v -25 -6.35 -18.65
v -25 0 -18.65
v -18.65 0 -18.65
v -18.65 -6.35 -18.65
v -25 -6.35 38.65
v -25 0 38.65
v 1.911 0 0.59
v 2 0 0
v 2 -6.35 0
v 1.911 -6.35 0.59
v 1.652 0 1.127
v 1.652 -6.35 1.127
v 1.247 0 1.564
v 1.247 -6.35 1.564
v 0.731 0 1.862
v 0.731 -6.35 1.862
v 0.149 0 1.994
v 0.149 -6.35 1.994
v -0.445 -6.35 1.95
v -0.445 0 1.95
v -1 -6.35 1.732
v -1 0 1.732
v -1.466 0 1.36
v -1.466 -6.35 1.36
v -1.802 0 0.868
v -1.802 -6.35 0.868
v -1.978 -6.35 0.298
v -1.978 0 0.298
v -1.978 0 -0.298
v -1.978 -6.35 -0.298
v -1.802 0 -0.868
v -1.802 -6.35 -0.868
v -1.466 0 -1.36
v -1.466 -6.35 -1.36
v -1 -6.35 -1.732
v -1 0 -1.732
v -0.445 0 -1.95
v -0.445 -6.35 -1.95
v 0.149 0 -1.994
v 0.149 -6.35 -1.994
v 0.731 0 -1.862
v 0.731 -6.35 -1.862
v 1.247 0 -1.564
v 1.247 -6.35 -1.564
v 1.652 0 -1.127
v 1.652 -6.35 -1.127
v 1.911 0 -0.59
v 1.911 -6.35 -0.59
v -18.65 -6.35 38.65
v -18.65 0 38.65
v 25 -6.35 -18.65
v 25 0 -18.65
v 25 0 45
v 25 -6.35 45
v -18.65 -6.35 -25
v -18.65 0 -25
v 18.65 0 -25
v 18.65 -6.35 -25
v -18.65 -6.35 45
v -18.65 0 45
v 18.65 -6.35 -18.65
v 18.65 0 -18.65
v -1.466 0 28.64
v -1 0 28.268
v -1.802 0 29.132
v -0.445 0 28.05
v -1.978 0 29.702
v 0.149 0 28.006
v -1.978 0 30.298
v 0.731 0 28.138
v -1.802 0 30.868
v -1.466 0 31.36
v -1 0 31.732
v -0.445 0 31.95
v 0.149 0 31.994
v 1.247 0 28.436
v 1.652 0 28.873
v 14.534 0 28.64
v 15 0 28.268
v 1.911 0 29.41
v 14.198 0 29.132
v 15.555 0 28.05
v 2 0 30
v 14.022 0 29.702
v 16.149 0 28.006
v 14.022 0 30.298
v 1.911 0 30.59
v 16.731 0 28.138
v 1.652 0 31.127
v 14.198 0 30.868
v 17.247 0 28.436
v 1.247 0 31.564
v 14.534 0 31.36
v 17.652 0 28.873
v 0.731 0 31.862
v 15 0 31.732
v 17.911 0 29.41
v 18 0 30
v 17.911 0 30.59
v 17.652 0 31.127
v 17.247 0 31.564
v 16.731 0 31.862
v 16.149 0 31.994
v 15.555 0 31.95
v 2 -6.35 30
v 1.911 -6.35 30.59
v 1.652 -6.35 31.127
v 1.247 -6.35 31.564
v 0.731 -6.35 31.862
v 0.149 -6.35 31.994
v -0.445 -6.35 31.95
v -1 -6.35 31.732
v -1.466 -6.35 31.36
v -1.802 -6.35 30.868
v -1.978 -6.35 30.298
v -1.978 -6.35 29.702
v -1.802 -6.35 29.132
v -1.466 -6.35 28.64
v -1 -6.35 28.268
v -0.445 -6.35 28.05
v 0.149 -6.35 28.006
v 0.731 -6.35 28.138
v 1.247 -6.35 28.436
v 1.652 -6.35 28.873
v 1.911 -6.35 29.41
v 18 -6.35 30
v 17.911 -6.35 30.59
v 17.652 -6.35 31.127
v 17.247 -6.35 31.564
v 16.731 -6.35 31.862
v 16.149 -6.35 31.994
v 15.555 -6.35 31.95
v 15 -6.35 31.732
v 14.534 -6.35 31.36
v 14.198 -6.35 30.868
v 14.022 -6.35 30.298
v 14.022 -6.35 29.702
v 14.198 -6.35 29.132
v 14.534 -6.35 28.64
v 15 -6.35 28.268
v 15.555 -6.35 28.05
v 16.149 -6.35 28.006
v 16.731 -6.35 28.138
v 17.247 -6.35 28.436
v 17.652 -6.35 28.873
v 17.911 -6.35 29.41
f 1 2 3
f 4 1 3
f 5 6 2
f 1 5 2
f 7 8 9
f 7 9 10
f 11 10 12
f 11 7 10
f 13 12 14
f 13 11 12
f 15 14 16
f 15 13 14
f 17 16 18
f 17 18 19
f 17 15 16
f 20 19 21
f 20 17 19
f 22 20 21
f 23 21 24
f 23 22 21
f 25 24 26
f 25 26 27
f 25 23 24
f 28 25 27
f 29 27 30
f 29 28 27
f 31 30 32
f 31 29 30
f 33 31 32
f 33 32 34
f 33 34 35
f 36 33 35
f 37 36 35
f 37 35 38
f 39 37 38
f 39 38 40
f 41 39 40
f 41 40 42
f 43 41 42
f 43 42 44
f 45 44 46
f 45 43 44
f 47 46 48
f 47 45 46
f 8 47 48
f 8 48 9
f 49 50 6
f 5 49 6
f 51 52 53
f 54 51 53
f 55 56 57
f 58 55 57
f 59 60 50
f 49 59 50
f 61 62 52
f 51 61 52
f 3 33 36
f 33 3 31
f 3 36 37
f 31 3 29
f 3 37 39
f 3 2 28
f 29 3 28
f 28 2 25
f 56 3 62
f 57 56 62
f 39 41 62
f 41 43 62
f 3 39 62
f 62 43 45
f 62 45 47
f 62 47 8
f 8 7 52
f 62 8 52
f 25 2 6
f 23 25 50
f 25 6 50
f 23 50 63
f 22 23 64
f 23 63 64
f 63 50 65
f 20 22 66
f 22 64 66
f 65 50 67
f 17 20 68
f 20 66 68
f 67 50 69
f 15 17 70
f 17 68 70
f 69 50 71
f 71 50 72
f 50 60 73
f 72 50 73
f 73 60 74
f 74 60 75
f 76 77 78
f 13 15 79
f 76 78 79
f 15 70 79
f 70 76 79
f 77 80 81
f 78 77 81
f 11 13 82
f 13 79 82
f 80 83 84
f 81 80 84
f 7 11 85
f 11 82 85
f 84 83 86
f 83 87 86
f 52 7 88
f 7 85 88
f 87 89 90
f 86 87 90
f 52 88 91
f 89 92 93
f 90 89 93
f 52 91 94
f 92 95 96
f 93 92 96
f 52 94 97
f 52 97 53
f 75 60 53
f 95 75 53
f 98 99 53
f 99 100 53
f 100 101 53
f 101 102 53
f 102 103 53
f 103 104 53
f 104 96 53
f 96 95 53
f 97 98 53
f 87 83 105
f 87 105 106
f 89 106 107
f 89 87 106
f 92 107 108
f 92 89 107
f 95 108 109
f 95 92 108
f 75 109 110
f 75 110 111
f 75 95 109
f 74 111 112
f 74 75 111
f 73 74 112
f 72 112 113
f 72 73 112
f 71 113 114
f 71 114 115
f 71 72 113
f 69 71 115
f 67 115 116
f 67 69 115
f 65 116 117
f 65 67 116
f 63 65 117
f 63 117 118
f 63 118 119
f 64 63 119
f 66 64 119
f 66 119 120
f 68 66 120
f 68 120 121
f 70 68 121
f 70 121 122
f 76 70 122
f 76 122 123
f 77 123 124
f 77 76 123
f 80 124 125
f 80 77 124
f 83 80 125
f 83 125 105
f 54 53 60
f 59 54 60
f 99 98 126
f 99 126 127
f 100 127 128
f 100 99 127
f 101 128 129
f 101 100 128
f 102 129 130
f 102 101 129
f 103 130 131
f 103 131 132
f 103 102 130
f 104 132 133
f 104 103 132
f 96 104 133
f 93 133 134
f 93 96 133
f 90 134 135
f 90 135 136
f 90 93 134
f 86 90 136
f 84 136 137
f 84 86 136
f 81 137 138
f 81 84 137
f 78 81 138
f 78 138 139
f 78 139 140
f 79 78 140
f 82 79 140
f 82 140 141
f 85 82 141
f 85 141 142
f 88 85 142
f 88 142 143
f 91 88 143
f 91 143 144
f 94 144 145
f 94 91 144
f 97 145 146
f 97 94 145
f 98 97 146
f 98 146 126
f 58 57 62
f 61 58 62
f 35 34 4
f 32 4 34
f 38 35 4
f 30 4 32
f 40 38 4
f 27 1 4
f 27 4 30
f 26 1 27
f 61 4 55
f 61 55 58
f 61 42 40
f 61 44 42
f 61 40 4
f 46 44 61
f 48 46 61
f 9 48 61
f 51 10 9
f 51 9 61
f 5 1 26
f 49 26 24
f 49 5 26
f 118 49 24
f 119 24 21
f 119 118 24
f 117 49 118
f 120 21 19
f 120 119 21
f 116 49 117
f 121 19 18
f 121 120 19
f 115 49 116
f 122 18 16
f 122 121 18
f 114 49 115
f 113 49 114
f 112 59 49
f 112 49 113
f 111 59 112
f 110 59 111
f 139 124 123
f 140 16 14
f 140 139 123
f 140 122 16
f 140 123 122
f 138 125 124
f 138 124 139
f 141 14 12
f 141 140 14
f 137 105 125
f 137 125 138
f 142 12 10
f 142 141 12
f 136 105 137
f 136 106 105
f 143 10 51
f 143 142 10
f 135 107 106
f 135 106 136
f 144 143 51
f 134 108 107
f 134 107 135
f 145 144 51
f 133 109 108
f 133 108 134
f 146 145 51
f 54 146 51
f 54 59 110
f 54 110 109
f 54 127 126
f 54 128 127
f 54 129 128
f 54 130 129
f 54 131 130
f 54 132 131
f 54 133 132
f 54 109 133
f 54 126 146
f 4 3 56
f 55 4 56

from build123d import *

# Parameters (mm, degrees)
F0_R     = 2
F1_DEPTH = 6.35


# Not quite as in the source:
# - a length typed as a fraction of an inch, garbled in the dataset ("3 / 203.2 mm" for 3/8 in), is restored


with BuildPart() as f1:
    # F0 (on Front) → F1 (new body)
    with BuildSketch(Plane.XZ):
        Polygon((25, 45), (-18.65, 45), (-18.65, 38.65), (-25, 38.65), (-25, 30), (-25, -18.65), (-18.65, -18.65), (-18.65, -25), (18.65, -25), (18.65, -18.65), (25, -18.65), align=None)
        Circle(F0_R, mode=Mode.SUBTRACT)
        with Locations((0, 30)):
            Circle(F0_R, mode=Mode.SUBTRACT)
        with Locations((16, 30)):
            Circle(F0_R, mode=Mode.SUBTRACT)
    extrude(amount=F1_DEPTH)


solid = f1.part
